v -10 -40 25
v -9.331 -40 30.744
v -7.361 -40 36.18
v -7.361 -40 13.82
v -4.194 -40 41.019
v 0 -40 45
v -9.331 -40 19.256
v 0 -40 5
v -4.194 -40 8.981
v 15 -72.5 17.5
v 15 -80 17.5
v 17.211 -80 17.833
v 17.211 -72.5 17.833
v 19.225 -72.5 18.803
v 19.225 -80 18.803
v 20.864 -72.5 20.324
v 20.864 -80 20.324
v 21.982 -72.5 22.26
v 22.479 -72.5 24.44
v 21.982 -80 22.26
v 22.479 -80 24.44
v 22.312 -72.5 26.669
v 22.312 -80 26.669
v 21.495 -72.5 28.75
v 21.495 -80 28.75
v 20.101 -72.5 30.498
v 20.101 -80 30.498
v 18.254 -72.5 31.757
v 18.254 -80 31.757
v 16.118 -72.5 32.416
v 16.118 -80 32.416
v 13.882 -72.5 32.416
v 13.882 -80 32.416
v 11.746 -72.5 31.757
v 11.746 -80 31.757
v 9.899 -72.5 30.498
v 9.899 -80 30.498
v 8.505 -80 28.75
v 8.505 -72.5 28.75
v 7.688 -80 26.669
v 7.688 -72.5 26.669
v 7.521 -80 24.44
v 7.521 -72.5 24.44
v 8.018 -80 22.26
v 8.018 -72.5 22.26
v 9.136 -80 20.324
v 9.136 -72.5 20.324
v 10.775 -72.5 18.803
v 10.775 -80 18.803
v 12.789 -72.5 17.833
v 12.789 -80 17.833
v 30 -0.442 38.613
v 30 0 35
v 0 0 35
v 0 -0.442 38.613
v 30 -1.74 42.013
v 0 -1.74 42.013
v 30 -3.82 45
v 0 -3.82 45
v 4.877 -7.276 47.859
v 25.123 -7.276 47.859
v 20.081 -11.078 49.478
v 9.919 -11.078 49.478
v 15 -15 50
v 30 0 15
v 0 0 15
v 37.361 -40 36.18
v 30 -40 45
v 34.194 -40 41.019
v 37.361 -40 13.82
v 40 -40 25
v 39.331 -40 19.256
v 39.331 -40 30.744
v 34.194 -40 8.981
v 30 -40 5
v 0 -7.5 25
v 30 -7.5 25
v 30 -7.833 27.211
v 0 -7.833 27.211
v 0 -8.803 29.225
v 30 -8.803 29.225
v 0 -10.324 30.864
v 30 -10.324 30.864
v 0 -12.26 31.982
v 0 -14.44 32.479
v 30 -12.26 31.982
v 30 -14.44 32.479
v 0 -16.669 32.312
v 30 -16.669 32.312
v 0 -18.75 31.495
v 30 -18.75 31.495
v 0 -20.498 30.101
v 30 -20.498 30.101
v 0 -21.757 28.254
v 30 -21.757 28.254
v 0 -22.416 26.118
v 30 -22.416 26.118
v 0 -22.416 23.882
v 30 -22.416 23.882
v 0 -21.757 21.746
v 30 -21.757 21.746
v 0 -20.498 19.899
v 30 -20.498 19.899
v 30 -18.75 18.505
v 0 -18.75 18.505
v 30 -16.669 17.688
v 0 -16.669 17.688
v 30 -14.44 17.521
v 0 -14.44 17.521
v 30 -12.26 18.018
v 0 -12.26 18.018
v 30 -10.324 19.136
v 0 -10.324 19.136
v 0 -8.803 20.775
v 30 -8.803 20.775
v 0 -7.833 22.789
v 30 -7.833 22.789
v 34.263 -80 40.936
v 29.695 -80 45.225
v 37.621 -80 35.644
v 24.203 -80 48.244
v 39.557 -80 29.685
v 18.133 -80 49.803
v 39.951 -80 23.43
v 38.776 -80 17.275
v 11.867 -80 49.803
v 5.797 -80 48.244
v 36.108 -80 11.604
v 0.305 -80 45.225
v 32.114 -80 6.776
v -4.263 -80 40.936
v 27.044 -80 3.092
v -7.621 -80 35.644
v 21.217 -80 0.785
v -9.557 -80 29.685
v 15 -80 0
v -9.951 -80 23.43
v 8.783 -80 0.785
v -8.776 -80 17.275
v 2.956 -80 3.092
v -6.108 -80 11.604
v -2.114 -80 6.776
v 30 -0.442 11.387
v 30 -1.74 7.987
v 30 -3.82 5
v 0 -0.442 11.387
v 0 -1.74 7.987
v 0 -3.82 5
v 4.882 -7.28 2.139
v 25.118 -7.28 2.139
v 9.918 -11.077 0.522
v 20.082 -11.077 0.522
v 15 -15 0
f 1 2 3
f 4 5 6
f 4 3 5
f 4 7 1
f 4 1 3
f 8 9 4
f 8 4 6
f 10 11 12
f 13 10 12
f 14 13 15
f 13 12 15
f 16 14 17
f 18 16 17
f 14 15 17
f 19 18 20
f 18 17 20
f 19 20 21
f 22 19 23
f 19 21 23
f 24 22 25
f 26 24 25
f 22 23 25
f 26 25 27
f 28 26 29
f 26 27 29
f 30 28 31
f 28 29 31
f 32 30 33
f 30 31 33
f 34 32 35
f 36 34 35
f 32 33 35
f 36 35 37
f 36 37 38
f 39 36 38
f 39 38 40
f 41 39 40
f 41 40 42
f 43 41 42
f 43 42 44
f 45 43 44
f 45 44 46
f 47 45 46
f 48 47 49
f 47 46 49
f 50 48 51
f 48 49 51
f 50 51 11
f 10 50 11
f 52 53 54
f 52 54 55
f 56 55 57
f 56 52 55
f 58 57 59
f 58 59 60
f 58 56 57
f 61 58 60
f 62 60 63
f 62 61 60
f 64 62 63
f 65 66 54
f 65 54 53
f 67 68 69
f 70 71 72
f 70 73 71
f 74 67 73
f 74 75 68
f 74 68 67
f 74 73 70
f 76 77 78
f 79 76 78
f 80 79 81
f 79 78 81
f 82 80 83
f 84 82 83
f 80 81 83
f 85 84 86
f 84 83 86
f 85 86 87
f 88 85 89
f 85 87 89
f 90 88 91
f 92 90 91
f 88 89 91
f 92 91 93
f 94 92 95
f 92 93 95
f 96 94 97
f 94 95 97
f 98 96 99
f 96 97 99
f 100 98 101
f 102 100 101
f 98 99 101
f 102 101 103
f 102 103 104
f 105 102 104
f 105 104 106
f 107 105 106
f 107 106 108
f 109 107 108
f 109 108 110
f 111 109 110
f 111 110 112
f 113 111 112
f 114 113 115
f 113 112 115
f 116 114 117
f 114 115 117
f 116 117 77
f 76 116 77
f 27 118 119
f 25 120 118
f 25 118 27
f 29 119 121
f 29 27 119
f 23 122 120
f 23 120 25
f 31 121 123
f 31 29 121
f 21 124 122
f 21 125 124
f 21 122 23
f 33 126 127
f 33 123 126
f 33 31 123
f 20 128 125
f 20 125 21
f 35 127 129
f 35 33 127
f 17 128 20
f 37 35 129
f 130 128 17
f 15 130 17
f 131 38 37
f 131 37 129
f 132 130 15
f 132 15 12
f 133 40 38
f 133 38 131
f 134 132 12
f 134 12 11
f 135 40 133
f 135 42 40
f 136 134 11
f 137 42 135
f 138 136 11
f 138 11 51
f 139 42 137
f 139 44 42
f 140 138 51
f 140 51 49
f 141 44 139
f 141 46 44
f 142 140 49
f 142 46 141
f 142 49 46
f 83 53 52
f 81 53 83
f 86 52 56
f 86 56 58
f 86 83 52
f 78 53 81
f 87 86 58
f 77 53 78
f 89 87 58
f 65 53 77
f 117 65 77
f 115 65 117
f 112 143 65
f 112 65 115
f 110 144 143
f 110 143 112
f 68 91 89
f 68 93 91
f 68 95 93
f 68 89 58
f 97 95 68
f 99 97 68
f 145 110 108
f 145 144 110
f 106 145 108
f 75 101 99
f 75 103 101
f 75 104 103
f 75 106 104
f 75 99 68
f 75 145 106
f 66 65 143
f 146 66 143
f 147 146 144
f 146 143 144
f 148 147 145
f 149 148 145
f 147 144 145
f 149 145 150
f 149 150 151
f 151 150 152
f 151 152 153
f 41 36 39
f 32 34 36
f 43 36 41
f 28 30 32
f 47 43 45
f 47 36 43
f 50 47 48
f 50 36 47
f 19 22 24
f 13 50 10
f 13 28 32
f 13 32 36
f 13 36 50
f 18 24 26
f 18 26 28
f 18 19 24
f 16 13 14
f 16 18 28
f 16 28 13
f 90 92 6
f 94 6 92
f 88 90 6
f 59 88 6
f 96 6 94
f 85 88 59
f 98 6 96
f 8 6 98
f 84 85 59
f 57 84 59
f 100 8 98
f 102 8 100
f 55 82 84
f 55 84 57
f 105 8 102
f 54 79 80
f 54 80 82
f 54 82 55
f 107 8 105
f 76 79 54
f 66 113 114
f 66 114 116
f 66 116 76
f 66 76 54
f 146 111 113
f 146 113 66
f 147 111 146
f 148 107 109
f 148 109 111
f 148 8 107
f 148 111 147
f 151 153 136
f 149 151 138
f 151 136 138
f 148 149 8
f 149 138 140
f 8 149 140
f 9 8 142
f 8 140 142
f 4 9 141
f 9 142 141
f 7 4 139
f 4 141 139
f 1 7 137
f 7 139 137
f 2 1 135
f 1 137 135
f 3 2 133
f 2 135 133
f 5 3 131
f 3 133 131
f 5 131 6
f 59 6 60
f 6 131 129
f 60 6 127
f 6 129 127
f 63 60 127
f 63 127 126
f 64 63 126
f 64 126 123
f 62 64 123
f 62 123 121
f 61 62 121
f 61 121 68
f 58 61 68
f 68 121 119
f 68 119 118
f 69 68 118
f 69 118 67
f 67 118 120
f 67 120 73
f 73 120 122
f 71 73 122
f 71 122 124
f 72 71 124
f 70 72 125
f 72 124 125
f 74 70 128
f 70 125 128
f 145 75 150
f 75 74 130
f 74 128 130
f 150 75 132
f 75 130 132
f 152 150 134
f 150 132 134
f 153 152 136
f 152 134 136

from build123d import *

# Parameters (mm, degrees)
SALIENTE_EXTRUIR1_DEPTH = 50
REDONDEO1_R             = 15
CROQUIS2_R              = 7.5
CORTAR_EXTRUIR1_DEPTH   = 30
REDONDEO3_R             = 25
CROQUIS3_R              = 7.5
CORTAR_EXTRUIR2_DEPTH   = 7.5


with BuildPart() as part:
    # Croquis1 → Saliente-Extruir1 (new body)
    with BuildSketch(Plane.XY):
        Polygon((0, 0), (30, 0), (30, -40), (40, -40), (40, -80), (-10, -80), (-10, -40), (0, -40), align=None)
    extrude(amount=SALIENTE_EXTRUIR1_DEPTH)

    # Redondeo1
    redondeo1_edges = [part.edges().sort_by_distance(p)[0] for p in [
        (15, 0, 0),
        (15, 0, 50),
    ]]
    fillet(redondeo1_edges, radius=REDONDEO1_R)

    # Croquis2 → Cortar-Extruir1 (cut)
    with BuildSketch(Plane(origin=(30, 0, 0), x_dir=(0, 0, -1), z_dir=(1, 0, 0))):
        with Locations(Location((-25, -15, 0), (0, 0, 90))):
            Circle(CROQUIS2_R)
    extrude(amount=-CORTAR_EXTRUIR1_DEPTH, mode=Mode.SUBTRACT)

    # Redondeo3
    # the kernel refuses this fillet: 25 mm, written as the material it takes off along each edge
    with BuildSketch(Plane(origin=(-10, -142.5, 50), x_dir=(1, 0, 0), z_dir=(0, 1, 0)), Plane(origin=(40, 22.5, 50), x_dir=(-1, 0, 0), z_dir=(0, -1, 0))) as redondeo3_piece_1:
        with BuildLine():
            CenterArc((REDONDEO3_R, REDONDEO3_R), REDONDEO3_R, 180, 90)
            Line((0, REDONDEO3_R), (0, 0))
            Line((0, 0), (REDONDEO3_R, 0))
        make_face()
    extrude(amount=165, mode=Mode.SUBTRACT)
    with BuildSketch(Plane(origin=(-10, -142.5, 0), x_dir=(1, 0, 0), z_dir=(0, 1, 0)), Plane(origin=(40, 22.5, 0), x_dir=(-1, 0, 0), z_dir=(0, -1, 0))) as redondeo3_piece_2:
        with BuildLine():
            CenterArc((REDONDEO3_R, -REDONDEO3_R), REDONDEO3_R, 90, 90)
            Line((0, -REDONDEO3_R), (0, 0))
            Line((0, 0), (REDONDEO3_R, 0))
        make_face()
    extrude(amount=165, mode=Mode.SUBTRACT)

    # Croquis3 → Cortar-Extruir2 (cut)
    with BuildSketch(Plane.XZ.offset(80)):
        with Locations(Location((15, 25, 0), (0, 0, 270))):
            Circle(CROQUIS3_R)
    extrude(amount=-CORTAR_EXTRUIR2_DEPTH, mode=Mode.SUBTRACT)


solid = part.part
